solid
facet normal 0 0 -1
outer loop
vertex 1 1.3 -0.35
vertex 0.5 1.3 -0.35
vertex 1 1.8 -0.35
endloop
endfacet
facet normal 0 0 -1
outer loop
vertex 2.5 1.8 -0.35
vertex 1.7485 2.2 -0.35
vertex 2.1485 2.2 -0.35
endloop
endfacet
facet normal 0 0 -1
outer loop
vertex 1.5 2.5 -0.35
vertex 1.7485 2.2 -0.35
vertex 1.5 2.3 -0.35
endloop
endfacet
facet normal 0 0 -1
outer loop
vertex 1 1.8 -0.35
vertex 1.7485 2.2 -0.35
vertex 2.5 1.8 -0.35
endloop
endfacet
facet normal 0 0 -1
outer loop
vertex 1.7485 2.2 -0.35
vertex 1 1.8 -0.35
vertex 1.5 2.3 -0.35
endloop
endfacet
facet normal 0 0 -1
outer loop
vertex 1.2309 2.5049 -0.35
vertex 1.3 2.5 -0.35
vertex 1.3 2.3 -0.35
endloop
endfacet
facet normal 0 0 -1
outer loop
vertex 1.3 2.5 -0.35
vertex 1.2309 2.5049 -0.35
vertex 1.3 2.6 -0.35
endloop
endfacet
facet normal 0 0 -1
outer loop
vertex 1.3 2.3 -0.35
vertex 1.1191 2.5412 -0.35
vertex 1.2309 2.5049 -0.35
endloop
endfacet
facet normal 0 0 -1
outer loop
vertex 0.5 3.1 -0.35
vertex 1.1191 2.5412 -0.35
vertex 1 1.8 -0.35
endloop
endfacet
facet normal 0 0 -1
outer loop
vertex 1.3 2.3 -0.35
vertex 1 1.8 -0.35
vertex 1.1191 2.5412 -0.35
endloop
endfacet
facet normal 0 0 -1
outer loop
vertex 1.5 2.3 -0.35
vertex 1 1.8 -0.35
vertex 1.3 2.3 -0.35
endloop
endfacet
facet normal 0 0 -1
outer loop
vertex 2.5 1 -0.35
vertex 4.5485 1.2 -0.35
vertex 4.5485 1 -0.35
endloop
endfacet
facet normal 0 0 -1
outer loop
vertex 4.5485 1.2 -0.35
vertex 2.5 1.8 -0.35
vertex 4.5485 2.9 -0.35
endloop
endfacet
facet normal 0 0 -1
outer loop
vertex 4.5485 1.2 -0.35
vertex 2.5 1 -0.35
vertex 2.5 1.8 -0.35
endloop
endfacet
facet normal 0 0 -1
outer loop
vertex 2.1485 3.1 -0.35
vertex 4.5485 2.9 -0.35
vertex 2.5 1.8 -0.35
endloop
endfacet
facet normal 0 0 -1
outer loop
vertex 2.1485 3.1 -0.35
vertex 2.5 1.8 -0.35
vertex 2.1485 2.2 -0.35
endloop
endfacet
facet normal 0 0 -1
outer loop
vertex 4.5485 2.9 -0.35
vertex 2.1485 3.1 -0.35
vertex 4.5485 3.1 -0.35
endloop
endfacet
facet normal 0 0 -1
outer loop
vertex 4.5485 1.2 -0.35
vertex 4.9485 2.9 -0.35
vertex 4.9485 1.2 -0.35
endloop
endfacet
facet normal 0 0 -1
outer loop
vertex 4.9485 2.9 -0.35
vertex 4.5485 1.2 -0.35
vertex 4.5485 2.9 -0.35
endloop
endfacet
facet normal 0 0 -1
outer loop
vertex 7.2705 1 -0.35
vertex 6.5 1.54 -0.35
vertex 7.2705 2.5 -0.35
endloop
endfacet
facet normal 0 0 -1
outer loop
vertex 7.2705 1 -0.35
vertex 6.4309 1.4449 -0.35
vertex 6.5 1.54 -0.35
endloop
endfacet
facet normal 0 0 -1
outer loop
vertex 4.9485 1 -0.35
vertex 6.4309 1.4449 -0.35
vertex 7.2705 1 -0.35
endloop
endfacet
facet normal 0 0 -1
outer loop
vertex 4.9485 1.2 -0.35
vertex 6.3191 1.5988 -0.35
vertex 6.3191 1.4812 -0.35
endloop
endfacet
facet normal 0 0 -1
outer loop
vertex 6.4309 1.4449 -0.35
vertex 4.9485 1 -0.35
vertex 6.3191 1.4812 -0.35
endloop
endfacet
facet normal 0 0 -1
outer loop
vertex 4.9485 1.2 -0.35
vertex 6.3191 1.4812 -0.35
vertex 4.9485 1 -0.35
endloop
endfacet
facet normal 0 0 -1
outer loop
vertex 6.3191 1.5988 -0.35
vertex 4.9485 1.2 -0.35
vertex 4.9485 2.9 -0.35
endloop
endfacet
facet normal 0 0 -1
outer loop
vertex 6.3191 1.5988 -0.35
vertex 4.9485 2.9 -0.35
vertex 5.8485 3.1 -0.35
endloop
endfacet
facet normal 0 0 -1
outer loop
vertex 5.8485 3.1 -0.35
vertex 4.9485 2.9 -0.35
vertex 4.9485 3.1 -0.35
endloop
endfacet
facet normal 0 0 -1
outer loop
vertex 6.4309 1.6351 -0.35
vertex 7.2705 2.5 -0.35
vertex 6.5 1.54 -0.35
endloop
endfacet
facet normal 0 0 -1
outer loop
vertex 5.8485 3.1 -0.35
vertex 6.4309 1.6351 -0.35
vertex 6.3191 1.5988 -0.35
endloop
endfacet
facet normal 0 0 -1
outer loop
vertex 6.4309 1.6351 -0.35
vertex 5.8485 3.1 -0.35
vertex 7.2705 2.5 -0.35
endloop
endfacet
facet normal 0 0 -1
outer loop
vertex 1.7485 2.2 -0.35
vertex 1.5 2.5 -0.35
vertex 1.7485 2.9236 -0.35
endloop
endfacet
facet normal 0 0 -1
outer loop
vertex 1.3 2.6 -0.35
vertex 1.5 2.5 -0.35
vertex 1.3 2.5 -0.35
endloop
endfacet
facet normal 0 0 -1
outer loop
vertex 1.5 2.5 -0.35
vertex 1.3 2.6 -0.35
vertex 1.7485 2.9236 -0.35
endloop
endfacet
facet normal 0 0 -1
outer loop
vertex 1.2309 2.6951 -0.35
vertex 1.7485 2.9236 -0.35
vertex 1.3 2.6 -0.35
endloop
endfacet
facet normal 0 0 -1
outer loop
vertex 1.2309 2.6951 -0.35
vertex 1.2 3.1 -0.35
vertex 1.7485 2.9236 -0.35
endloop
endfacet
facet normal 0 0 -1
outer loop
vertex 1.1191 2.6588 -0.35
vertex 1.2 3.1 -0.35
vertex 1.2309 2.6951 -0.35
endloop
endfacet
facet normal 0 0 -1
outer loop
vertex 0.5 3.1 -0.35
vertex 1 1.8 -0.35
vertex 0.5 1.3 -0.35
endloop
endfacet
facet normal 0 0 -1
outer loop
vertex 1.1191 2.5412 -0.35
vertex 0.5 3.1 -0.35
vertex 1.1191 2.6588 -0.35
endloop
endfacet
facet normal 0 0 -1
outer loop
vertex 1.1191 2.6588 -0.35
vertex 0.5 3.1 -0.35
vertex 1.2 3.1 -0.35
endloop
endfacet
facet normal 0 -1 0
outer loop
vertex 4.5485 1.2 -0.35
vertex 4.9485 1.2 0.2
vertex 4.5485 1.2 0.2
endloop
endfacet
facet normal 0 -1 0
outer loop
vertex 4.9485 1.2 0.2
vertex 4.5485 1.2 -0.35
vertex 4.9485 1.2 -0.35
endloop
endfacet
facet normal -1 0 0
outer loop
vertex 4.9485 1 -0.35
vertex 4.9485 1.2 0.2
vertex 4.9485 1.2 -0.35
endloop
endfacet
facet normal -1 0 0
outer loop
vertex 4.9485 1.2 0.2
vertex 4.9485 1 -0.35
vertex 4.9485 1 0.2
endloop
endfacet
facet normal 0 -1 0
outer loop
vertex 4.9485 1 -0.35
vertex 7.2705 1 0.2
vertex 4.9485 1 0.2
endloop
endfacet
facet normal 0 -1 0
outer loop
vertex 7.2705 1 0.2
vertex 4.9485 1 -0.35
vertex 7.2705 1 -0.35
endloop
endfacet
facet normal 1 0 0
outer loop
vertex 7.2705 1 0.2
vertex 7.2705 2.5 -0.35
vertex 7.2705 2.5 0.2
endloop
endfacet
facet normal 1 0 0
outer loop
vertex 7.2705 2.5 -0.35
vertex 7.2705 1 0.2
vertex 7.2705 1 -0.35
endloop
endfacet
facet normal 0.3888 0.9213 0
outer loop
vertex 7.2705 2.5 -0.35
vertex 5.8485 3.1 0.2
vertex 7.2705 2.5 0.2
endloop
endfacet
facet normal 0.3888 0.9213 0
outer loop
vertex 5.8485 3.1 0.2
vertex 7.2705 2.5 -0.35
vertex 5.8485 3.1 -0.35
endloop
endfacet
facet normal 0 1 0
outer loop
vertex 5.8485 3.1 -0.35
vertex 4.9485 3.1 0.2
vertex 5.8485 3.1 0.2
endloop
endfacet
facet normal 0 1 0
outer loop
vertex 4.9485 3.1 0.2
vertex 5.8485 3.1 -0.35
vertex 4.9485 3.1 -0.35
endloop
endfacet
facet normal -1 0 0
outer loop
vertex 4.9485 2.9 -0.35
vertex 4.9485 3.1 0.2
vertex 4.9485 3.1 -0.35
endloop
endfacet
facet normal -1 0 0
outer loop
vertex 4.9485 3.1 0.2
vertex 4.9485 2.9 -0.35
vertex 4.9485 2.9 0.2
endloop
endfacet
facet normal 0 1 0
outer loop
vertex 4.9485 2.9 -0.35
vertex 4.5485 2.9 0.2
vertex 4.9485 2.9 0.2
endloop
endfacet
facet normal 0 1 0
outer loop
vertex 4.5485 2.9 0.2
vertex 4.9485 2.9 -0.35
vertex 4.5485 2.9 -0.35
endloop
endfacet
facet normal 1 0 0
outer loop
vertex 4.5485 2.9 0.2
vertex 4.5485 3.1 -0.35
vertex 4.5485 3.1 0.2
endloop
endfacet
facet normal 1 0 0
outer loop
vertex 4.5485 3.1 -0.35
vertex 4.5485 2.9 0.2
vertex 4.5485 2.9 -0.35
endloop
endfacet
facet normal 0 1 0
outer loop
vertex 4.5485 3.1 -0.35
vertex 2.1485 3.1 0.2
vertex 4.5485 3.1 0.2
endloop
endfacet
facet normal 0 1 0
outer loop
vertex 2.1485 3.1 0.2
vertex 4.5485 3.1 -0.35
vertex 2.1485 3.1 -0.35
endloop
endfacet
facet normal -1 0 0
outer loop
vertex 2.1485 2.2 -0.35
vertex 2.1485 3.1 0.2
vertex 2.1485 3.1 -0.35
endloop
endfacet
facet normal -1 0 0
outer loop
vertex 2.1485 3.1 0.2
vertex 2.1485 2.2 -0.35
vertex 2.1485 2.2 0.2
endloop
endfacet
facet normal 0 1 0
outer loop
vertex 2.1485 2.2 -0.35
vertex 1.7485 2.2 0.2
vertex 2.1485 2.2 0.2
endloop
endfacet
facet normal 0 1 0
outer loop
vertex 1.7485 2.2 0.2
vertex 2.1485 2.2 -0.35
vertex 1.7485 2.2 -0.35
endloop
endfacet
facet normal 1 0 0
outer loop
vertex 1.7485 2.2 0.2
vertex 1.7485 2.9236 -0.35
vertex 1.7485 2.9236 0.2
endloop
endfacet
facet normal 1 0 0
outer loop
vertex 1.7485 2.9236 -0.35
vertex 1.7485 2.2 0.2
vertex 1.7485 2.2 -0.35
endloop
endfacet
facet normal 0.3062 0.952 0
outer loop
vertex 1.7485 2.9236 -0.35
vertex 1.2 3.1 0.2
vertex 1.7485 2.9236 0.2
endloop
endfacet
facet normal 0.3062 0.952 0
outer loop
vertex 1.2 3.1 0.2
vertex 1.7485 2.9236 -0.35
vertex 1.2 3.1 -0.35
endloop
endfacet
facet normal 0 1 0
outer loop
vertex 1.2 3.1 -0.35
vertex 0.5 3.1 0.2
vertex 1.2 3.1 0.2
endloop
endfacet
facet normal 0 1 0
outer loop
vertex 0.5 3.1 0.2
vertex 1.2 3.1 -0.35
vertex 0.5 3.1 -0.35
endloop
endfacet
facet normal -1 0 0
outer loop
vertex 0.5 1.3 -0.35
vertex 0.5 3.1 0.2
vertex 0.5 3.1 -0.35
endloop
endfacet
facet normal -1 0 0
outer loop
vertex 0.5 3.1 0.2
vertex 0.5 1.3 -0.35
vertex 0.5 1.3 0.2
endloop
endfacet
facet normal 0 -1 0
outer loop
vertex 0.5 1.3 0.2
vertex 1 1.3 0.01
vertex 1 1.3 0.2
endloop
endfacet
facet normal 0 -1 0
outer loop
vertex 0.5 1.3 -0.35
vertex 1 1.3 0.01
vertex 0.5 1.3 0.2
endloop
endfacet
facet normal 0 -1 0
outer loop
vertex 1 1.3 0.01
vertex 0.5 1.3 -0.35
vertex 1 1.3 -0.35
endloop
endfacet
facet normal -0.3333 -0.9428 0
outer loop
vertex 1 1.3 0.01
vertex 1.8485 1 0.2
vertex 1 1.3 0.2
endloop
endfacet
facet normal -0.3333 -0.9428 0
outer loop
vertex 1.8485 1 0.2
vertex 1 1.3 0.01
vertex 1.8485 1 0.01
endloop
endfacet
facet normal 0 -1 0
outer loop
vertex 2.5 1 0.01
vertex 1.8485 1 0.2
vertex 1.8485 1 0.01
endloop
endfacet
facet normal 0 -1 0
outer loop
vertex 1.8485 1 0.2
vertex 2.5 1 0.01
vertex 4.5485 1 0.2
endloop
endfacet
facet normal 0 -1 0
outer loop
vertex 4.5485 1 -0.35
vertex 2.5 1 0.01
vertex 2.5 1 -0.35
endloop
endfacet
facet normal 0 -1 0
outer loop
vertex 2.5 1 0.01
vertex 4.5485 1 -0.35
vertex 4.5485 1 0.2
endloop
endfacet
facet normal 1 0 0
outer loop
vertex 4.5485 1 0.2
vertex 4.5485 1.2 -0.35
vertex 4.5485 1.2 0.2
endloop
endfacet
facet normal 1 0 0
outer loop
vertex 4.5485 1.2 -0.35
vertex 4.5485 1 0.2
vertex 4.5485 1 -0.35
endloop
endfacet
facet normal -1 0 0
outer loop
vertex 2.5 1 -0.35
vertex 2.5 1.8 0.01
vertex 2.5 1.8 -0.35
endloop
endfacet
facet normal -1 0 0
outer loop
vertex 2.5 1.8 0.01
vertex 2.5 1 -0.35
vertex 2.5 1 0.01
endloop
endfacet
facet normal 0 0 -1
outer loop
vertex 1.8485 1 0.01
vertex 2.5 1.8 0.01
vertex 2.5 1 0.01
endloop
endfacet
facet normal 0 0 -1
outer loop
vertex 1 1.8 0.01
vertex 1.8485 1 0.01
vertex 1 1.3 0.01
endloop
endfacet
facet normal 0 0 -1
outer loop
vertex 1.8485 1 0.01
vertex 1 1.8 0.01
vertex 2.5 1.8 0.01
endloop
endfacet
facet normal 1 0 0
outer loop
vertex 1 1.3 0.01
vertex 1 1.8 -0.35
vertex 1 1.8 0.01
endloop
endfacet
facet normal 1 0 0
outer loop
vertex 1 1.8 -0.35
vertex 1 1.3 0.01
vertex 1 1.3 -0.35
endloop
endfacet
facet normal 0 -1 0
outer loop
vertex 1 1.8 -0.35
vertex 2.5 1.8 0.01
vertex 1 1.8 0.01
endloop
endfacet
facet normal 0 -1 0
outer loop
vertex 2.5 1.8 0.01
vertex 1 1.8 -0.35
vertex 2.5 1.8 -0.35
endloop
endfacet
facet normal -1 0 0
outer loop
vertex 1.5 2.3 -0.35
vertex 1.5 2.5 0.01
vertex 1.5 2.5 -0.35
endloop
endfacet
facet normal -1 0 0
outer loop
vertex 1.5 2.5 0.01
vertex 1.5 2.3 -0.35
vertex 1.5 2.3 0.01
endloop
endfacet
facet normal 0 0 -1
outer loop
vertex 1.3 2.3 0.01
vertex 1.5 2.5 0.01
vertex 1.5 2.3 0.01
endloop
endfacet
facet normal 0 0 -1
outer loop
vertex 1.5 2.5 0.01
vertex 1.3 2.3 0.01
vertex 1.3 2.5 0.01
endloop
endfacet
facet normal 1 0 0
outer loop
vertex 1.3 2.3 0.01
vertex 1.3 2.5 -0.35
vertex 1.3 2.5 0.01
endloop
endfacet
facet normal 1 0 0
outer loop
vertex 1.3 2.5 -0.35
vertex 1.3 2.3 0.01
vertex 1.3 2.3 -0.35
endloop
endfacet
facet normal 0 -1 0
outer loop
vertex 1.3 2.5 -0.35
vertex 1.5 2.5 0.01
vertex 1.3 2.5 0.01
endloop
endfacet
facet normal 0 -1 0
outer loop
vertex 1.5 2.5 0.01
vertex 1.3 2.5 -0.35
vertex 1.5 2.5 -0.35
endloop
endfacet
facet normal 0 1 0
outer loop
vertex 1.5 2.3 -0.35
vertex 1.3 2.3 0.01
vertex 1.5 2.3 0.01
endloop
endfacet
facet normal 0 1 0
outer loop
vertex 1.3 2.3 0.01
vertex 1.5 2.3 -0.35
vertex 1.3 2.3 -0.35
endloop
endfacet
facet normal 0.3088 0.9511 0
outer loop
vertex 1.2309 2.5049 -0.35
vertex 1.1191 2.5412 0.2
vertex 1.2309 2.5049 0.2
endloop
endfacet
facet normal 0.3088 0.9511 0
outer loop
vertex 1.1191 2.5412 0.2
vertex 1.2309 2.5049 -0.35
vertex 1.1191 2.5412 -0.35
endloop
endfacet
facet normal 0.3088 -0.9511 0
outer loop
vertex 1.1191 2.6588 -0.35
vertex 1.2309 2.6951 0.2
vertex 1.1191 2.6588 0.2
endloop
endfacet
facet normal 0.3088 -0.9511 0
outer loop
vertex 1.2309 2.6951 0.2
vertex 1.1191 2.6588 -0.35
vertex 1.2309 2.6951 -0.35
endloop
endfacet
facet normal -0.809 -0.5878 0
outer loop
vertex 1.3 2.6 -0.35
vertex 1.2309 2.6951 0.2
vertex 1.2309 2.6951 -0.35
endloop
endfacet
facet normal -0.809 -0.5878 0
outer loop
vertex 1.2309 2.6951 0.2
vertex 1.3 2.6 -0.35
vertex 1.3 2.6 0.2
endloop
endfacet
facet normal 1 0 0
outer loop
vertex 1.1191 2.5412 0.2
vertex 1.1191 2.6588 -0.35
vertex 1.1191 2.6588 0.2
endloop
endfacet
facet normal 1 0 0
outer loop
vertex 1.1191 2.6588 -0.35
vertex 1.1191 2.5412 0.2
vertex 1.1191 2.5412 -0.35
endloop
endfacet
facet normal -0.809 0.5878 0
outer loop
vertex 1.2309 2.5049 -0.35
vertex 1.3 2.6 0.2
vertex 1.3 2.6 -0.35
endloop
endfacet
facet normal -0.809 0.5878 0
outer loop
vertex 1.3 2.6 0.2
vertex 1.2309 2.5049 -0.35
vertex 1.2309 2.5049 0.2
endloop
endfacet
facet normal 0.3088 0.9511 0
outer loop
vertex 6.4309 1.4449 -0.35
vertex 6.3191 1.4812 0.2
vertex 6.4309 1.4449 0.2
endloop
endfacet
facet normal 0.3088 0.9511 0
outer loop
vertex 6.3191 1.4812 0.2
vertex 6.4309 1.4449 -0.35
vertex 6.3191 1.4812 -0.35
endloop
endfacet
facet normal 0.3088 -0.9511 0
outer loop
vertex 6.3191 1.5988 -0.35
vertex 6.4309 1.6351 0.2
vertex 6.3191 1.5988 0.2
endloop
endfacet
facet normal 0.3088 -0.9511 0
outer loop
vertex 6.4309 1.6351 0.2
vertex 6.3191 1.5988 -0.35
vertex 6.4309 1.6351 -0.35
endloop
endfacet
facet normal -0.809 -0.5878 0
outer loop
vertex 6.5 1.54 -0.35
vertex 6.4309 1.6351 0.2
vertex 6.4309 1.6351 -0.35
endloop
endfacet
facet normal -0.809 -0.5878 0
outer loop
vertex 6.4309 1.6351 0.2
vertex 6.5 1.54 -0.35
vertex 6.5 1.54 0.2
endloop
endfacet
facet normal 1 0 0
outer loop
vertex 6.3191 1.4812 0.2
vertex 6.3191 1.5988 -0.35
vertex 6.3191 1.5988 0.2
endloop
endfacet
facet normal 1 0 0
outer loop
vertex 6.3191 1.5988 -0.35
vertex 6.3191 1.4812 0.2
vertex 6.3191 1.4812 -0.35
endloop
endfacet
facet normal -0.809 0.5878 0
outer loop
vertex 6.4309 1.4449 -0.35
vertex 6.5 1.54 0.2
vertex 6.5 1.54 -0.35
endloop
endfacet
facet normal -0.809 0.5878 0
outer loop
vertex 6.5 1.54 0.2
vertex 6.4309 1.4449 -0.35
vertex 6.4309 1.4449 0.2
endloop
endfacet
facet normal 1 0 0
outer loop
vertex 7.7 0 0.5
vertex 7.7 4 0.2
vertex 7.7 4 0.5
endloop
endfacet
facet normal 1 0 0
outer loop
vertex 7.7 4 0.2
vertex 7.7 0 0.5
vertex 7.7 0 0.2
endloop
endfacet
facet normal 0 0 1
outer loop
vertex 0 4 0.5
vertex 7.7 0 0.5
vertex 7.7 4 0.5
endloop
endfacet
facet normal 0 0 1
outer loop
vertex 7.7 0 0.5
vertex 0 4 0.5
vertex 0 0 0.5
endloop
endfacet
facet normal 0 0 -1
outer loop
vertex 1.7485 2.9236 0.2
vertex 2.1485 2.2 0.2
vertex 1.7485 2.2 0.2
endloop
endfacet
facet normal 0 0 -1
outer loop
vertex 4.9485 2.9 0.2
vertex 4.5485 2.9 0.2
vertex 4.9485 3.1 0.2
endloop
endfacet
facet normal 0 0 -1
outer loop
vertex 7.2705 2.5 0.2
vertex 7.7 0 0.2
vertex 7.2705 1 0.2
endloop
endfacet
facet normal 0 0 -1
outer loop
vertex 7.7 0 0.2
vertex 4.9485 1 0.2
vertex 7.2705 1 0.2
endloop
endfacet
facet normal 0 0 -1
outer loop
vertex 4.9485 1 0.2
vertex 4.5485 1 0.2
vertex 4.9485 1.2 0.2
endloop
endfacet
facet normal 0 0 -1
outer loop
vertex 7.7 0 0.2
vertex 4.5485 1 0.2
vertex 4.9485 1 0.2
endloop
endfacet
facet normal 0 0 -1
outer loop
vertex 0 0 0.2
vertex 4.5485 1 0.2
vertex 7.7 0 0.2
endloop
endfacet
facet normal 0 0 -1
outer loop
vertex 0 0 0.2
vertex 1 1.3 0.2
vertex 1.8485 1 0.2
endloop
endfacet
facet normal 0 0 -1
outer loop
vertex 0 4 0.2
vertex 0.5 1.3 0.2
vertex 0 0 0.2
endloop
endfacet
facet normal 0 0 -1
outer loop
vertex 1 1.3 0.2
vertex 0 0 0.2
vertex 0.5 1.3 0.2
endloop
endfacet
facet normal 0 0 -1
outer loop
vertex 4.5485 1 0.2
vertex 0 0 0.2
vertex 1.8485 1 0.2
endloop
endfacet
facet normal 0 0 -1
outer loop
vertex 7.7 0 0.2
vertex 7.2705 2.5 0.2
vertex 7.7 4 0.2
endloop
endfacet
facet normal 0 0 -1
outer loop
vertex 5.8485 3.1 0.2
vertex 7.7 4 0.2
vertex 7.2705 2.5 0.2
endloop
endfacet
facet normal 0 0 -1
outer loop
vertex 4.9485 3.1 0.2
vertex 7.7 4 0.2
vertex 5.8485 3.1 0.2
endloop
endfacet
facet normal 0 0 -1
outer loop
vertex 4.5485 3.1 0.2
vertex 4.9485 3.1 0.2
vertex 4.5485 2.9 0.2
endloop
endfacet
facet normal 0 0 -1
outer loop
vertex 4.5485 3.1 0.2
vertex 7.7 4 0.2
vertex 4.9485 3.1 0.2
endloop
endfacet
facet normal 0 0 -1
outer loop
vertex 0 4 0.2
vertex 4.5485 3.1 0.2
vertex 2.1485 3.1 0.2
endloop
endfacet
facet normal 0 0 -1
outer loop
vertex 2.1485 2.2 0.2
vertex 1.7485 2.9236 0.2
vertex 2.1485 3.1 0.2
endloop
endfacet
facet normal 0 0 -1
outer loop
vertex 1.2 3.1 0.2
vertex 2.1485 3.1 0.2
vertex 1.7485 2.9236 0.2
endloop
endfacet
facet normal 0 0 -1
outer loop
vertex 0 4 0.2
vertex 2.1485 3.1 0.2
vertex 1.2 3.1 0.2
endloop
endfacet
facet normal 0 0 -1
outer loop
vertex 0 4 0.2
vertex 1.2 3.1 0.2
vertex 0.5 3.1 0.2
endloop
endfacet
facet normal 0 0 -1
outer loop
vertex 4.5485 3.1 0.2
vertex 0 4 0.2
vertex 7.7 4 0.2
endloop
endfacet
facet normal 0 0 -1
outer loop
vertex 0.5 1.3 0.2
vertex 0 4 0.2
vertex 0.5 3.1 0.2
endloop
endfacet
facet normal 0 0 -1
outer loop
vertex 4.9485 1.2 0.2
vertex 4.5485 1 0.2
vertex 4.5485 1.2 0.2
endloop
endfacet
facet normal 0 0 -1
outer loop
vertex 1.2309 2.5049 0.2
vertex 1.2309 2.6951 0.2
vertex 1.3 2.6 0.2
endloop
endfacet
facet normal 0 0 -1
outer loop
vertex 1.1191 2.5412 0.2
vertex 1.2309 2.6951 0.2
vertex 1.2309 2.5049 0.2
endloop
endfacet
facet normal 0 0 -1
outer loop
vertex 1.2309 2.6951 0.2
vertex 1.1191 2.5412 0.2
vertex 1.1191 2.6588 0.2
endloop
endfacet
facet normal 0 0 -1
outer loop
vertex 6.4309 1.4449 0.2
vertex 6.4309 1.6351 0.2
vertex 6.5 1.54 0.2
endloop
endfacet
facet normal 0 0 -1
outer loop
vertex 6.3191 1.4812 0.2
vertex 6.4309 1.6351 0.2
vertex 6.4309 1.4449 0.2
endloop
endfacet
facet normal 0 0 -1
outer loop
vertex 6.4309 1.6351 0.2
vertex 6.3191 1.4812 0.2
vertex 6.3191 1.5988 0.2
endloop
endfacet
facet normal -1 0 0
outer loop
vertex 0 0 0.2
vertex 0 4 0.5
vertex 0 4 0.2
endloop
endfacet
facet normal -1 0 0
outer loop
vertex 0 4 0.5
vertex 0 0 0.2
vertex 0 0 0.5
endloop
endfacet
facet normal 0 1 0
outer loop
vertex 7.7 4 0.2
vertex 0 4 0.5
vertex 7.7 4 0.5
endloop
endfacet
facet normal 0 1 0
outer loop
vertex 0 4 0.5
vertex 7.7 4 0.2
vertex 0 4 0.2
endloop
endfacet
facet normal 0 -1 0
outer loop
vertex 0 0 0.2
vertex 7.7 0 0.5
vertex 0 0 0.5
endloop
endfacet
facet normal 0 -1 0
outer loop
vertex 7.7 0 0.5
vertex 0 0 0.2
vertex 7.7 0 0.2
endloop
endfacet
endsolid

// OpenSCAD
module backFastner()
{ 
   difference()
   {     
        //Draw Back Plate
        color([255,0,0,255])
        {
         translate([0,0,0.2]) { cube([7.7, 4, 0.3]); }
        }
        
        //Screw Center
        //translate([23,20,0]) { cylinder(h=5, r=0.15); }  
        //Screw Down
        //translate([33,5,0]) { cylinder(h=5, r=0.15); }  
   } 

}


module cameraBracket()
{  
   //     Ax            Bx            Cx   Dx   Ex     
   //          _____________________     _____ 
   //       /                        \__/      \  
   //     |                                     |
   //     |                                     |
   //     |   _                        __       |
   //      \_/ \_____________________/   \_____/
   //

   FullLength=5.7;   

   Ax=0.84852813;
   Bx=2.7;
   Cx=0.4;
   Dx=0.9;
   Ex=0.9219544;  
   
   ABx = Ax + Bx;
   ABCx = ABx + Cx;
   ABCDx = ABCx + Dx;
   ABCDEx = ABCDx + Ex;



   Ayl=0.3;
   Byl=1.3; 
   Cyl=0.3236067; 
   AByl = Ayl+Byl;
   ABCyl = AByl+Cyl;



   Ayr=0.6;
   Byr=0.9; 
   Cyr=0.6;

   down = Ayr+Byr+Cyr;
 
   sX = 1.0;
   sY = 1.0; 
 

difference()
 {    

  linear_extrude(height = 0.7,center = true,convexity = 10,twist = 0,slices = 1,scale = 1.0)
  { 
   polygon(
            points=[
                    [sX+0        , sY+Ayl],    // 0 
                    [sX+Ax       , sY],        // 1
                    [sX+ABx      , sY],        // 2
                    [sX+ABx      , sY+0.2],    // 3
                    [sX+ABCx     , sY+0.2],    // 4
                    [sX+ABCx     , sY],        // 5
                    [sX+ABCDx    , sY],        // 6
                    [sX+ABCDEx+0.5   , sY],     // 7 +Ayr for good shape
                    [sX+ABCDEx+0.5   , sY+Ayr+Byr],  // 8 
                    [sX+ABCDx    , sY+down],     // 9
                    [sX+ABCx     , sY+down],     // 10
                    [sX+ABCx     , sY+down-0.2], // 11
                    [sX+ABx      , sY+down-0.2], // 12
                    [sX+ABx      , sY+down],     //13
                    [sX+ABx-2.4  , sY+down],     //14
                    [sX+ABx-2.4  , sY+down-0.9],   //15
                    [sX+ABx-2.8   , sY+down-0.9],     //16
                    [sX+ABx-2.8   , sY+ABCyl],     //17
                    [sX+0.2   , sY+down],     //18
                    [sX-0.5   , sY+down],     //19
                    [sX-0.5   , sY+Ayl],     //20
                    [sX        , sY+Ayl]    // 21 


                   ], paths=[[0,1,2,3,4,5,6,7,8,9,10,11,12,13,14,15,16,17,18,19,20,21]]
         );
  }  
    
  //Remove Space for the plug
  translate([sX,sY,-0.35]) { cube([1.5, 0.8, 0.36]); }
  //Remove Space for Groud Solder
  translate([sX+0.3,sY+1.3,-0.35]) { cube([0.2, 0.2, 0.36]); }


  //Screw Bottom Left
  translate([sX+0.2,sY+1.6,-0.35]) { cylinder(h=5, r=0.10); }  
  //Screw Top Right
  translate([sX+FullLength-0.3,sY+0.54,-0.35]) { cylinder(h=5, r=0.10); }  
}

  /*
 color([0,255,0,255])
        {
         translate([sX,sY+1.6,-0.4]) { cube([0.7, 0.8, 0.4]); }
        }
*/
 
}
  
backFastner();
cameraBracket();
